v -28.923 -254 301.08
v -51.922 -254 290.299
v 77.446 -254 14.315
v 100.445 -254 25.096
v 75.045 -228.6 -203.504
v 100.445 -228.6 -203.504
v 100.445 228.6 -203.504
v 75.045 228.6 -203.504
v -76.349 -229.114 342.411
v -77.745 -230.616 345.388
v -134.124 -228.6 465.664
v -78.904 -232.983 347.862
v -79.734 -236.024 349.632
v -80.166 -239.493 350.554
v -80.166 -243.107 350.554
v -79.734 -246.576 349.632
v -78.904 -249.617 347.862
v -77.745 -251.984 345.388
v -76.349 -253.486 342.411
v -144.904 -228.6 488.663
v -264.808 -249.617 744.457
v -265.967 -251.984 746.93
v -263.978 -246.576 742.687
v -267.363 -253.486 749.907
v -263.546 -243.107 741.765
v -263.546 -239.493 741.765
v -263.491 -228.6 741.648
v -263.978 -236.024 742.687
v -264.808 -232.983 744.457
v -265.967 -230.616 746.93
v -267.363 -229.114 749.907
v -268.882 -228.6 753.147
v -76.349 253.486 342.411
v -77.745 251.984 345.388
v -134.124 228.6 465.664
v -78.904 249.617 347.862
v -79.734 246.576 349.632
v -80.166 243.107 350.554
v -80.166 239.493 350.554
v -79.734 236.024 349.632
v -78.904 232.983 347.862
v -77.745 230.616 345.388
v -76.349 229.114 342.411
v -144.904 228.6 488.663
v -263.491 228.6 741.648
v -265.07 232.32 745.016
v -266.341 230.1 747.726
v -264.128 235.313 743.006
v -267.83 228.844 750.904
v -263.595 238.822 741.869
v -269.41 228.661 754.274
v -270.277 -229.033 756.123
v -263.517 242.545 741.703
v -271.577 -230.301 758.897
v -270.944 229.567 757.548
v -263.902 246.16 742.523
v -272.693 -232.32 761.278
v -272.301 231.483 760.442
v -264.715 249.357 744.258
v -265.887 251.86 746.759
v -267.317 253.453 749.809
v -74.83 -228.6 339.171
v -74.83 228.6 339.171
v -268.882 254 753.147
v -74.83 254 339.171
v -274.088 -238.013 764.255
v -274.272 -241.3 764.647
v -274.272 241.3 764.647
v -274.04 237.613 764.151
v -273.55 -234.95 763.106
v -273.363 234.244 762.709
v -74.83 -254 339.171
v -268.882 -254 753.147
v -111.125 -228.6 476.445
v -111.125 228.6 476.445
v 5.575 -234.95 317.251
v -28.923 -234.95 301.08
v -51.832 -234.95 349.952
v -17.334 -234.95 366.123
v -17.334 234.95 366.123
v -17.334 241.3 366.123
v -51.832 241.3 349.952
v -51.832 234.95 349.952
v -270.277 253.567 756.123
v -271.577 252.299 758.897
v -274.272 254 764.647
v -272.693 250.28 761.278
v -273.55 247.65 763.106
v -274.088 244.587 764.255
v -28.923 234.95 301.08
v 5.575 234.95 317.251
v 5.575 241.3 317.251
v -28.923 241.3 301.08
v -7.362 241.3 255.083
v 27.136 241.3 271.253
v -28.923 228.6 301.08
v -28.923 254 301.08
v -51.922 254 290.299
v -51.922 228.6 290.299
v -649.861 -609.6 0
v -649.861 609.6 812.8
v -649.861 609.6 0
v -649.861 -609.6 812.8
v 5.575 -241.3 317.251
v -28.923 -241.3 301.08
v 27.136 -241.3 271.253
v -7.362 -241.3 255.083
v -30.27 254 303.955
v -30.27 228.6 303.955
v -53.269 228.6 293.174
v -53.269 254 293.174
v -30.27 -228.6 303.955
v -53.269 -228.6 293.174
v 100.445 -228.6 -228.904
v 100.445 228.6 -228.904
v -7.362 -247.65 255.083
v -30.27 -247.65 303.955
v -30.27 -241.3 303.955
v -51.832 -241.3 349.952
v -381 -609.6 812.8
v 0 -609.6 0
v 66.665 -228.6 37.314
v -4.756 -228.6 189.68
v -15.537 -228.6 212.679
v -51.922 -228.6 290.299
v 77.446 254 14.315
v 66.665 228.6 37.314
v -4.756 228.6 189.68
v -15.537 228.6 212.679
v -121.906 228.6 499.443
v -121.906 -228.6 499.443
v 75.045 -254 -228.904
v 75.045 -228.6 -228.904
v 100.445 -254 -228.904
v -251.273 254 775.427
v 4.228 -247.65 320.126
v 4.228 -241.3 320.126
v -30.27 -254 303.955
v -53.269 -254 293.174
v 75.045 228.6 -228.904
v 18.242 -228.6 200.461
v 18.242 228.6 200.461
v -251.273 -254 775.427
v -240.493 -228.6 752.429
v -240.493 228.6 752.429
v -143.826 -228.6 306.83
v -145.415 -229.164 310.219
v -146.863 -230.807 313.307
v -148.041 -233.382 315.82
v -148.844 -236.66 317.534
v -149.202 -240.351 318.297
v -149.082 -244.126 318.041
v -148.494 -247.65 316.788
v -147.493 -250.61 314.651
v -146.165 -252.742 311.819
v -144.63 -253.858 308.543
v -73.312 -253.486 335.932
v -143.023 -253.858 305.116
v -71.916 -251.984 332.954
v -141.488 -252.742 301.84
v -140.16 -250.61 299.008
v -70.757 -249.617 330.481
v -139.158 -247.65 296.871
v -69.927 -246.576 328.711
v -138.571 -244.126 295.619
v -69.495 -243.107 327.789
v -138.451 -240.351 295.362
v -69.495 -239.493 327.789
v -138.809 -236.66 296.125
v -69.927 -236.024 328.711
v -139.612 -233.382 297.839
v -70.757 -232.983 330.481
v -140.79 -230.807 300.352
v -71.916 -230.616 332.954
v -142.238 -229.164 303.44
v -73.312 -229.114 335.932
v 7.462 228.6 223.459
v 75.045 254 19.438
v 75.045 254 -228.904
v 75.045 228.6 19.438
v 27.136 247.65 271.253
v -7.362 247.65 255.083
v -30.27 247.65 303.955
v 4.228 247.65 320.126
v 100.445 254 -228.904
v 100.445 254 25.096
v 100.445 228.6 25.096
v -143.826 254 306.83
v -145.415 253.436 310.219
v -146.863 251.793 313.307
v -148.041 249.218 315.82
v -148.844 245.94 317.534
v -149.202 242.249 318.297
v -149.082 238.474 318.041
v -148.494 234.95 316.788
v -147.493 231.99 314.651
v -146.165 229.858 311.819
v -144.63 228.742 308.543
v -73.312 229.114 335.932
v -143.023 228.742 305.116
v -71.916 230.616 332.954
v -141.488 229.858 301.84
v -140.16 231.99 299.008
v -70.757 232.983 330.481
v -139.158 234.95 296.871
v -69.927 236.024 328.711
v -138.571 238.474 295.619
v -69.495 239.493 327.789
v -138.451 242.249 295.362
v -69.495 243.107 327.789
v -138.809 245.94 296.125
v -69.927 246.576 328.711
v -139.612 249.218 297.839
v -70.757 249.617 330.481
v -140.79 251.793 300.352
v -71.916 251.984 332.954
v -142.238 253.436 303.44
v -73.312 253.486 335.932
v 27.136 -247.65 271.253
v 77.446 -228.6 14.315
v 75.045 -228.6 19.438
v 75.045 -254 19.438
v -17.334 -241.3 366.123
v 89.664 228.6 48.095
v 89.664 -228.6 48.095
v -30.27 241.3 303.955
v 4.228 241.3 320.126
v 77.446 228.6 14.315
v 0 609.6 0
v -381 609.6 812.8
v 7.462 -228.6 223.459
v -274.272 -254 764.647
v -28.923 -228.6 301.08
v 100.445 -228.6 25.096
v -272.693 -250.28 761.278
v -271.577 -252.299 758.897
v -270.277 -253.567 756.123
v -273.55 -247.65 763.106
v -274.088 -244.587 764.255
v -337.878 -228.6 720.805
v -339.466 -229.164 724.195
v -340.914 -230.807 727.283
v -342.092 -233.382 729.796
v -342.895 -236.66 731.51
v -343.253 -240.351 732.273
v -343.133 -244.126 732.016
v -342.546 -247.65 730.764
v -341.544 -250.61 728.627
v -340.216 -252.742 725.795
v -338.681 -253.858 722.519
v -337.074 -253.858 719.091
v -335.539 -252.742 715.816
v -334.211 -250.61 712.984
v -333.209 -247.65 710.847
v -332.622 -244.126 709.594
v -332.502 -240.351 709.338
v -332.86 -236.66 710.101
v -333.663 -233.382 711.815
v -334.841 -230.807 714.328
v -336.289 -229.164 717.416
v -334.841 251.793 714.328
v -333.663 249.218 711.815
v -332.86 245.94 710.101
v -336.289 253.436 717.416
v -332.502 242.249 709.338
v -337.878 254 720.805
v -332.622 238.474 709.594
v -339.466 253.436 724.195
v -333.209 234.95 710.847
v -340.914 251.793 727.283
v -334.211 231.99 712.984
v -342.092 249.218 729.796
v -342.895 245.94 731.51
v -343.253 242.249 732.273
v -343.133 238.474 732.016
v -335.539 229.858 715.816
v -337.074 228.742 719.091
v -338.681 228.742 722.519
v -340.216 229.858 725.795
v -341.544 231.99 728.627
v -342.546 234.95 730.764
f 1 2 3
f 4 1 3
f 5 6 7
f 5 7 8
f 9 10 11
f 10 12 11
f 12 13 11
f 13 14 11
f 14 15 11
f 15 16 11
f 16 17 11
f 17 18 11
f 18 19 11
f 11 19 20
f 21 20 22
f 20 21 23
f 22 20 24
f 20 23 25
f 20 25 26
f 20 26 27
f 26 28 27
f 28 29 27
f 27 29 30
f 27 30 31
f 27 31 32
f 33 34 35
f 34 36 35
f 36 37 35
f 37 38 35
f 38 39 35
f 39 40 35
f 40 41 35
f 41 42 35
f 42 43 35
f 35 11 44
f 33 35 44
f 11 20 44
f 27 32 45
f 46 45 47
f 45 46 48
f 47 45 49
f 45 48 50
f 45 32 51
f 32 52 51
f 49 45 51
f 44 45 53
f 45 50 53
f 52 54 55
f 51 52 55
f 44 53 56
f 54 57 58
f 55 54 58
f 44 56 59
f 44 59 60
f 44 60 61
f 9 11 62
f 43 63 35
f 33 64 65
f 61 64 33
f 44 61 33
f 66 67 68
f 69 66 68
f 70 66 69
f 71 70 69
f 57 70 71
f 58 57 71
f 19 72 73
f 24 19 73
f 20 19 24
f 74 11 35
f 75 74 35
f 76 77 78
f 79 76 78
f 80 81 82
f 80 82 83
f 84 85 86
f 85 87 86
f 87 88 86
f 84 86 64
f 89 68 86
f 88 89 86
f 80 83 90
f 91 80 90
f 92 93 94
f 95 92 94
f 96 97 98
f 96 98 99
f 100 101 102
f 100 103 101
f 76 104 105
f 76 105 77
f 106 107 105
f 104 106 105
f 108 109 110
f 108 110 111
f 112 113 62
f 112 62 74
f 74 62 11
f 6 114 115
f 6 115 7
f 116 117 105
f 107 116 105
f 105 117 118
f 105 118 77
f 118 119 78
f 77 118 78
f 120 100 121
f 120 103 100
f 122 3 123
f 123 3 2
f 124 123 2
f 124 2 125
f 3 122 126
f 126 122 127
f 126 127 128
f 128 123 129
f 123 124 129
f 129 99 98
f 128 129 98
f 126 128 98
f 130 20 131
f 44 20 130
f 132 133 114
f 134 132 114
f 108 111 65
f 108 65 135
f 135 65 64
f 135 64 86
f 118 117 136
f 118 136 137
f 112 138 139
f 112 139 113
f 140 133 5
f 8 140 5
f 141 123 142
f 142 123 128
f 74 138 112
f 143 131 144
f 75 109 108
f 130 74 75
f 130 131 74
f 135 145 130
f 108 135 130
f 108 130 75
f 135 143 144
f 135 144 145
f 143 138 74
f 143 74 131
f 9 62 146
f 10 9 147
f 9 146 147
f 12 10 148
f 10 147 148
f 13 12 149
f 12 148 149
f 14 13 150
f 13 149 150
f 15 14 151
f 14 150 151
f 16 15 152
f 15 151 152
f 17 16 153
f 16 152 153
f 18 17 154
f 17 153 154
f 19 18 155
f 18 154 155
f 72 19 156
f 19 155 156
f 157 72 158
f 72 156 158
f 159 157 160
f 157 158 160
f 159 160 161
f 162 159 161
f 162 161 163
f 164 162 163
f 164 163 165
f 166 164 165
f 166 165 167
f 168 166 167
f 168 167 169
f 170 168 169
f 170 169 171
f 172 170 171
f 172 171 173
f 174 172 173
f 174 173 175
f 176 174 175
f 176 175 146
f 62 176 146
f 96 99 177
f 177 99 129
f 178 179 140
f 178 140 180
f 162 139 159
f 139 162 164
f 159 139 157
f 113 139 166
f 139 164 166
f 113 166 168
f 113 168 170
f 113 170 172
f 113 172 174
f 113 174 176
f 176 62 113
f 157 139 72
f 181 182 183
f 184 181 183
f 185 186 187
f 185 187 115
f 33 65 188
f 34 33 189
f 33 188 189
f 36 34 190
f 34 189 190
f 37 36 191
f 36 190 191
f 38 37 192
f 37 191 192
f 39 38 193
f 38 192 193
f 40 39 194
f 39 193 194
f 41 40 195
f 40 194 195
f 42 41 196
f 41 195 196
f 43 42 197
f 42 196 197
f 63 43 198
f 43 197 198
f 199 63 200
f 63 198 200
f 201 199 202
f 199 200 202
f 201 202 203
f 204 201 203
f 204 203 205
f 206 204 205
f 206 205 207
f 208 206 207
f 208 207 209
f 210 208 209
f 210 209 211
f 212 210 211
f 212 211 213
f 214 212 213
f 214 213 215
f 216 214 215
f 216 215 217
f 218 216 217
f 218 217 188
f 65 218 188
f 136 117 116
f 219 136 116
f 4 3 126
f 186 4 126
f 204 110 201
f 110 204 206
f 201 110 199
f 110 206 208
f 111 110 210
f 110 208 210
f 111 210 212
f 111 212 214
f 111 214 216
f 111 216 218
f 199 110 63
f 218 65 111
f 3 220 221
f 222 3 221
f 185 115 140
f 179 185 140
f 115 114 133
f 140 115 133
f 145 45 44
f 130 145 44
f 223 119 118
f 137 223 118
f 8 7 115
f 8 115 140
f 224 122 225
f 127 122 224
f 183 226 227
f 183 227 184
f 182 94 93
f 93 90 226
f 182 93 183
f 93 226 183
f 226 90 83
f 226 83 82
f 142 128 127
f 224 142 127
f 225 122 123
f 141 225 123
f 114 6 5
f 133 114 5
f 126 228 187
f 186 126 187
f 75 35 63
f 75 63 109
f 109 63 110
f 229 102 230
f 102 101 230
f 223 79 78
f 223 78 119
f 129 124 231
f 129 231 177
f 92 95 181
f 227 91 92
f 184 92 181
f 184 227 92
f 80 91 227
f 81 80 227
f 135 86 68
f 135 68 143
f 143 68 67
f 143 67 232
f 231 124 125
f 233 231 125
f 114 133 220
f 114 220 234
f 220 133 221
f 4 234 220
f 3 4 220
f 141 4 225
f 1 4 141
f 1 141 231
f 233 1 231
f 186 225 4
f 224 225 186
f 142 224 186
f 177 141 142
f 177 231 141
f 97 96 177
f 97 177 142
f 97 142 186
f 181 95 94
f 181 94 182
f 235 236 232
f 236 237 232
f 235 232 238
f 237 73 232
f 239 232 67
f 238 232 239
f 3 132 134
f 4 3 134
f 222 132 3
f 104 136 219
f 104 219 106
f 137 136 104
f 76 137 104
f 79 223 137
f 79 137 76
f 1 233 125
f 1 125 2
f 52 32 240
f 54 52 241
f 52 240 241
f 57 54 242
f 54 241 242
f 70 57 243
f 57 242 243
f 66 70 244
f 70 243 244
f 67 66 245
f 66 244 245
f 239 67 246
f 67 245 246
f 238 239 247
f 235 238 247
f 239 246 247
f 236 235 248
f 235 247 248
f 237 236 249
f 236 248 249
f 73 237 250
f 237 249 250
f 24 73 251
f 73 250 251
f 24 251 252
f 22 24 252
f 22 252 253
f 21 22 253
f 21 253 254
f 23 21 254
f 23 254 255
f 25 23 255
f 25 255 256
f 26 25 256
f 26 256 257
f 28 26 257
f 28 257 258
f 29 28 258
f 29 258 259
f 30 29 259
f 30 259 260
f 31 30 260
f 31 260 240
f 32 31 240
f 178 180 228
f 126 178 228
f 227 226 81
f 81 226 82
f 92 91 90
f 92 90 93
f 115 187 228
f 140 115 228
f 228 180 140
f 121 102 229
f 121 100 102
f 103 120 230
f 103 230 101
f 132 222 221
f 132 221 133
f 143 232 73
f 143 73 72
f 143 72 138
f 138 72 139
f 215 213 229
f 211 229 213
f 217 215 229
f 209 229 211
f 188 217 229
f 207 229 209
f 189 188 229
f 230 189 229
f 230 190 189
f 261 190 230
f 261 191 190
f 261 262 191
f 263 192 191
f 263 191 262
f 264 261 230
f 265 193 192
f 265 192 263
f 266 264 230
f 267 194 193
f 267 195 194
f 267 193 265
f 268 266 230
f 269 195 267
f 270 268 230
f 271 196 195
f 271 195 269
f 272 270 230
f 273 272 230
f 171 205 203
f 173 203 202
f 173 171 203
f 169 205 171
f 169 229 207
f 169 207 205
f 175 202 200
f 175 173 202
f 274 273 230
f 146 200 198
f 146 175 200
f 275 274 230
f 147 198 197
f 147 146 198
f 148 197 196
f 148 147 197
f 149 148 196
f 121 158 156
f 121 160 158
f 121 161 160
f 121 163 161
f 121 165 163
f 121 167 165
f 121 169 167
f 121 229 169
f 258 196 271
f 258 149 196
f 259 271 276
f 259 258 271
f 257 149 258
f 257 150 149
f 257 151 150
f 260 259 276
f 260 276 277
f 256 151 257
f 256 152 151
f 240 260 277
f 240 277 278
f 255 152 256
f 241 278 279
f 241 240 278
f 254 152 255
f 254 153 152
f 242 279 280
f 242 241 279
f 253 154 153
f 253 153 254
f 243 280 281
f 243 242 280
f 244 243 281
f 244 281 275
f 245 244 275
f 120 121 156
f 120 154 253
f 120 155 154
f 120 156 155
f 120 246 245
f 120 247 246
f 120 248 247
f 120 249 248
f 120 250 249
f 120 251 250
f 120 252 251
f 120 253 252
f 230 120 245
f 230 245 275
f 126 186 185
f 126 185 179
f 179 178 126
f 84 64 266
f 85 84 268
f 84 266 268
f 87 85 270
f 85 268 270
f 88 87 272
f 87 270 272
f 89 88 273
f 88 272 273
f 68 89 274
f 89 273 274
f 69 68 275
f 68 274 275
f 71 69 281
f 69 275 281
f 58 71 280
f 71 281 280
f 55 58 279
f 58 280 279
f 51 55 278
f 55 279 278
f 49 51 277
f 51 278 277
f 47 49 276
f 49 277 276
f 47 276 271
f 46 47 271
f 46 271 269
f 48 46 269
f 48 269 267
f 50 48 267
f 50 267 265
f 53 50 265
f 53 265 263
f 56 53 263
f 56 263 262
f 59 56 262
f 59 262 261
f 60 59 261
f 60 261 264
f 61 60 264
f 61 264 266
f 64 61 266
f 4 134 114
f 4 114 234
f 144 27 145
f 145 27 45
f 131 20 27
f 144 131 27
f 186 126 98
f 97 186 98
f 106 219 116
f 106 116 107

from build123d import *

# Parameters (mm, degrees)
F1_DEPTH  = 609.6
F2_R      = 12.7
F3_DEPTH  = 76.2
F4_W      = 457.2
F4_H      = 25.4
F5_DEPTH  = 25.4
F7_DEPTH  = 25.4
F9_DEPTH  = 25.4
F10_W     = 25.4
F10_H     = 25.4
F11_DEPTH = 457.2
F12_W     = 6.35
F12_H     = 50.8
F12_H_2   = 3.175
F13_DEPTH = 38.1


with BuildPart() as f1:
    # F0 (on Front) → F1 (new body, symmetric)
    with BuildSketch(Plane.XZ):
        Polygon((-649.8614549637, 0), (0, 0), (-381, 812.8), (-649.8614549637, 812.8), align=None)
    extrude(amount=F1_DEPTH, both=True)

    # F2 (on face) → F3 (join)
    with BuildSketch(Plane(origin=(0, 0, 0), x_dir=(0, 1, 0), z_dir=(0.905458936, 0, 0.4244338762))):
        with Locations((-241.3, 796.0663299913)):
            Circle(F2_R)
        with Locations((241.3, 796.0663299913)):
            Circle(F2_R)
        with Locations((241.3, 338.8663299913)):
            Circle(F2_R)
        with Locations((-241.3, 338.8663299913)):
            Circle(F2_R)
    extrude(amount=F3_DEPTH)

    # F4 (on face) → F5 (join)
    with BuildSketch(Plane(origin=(68.9959709201, 0, 32.3418613688), x_dir=(0, 1, 0), z_dir=(0.905458936, 0, 0.4244338762))):
        with BuildLine():
            Line((228.6, 796.0663299913), (-228.6, 796.0663299913))
            ThreePointArc((-228.6, 796.0663299913), (-232.3197438789, 787.0860738702), (-241.3, 783.3663299913))
            Line((-241.3, 783.3663299913), (-241.3, 351.5663299913))
            ThreePointArc((-241.3, 351.5663299913), (-232.3197438789, 347.8465861123), (-228.6, 338.8663299913))
            Line((-228.6, 338.8663299913), (-228.6, 478.5663299913))
            Line((-228.6, 478.5663299913), (-228.6, 503.9663299913))
            Line((-228.6, 503.9663299913), (-228.6, 783.3663299913))
            Line((-228.6, 783.3663299913), (228.6, 783.3663299913))
            Line((228.6, 783.3663299913), (228.6, 503.9663299913))
            Line((228.6, 503.9663299913), (228.6, 478.5663299913))
            Line((228.6, 478.5663299913), (228.6, 338.8663299913))
            ThreePointArc((228.6, 338.8663299913), (232.3197438789, 347.8465861123), (241.3, 351.5663299913))
            Line((241.3, 351.5663299913), (241.3, 783.3663299913))
            ThreePointArc((241.3, 783.3663299913), (232.3197438789, 787.0860738702), (228.6, 796.0663299913))
        make_face()
        with BuildLine():
            ThreePointArc((-241.3, 808.7663299913), (-232.3197438789, 805.0465861123), (-228.6, 796.0663299913))
            Line((-228.6, 796.0663299913), (228.6, 796.0663299913))
            ThreePointArc((228.6, 796.0663299913), (232.3197438789, 805.0465861123), (241.3, 808.7663299913))
            Line((241.3, 808.7663299913), (-241.3, 808.7663299913))
        make_face()
        with BuildLine():
            Line((-241.3, 351.5663299913), (-241.3, 783.3663299913))
            ThreePointArc((-241.3, 783.3663299913), (-250.2802561211, 787.0860738702), (-254, 796.0663299913))
            Line((-254, 796.0663299913), (-254, 338.8663299913))
            ThreePointArc((-254, 338.8663299913), (-250.2802561211, 347.8465861123), (-241.3, 351.5663299913))
        make_face()
        with BuildLine():
            ThreePointArc((254, 796.0663299913), (250.2802561211, 787.0860738702), (241.3, 783.3663299913))
            Line((241.3, 783.3663299913), (241.3, 351.5663299913))
            ThreePointArc((241.3, 351.5663299913), (250.2802561211, 347.8465861123), (254, 338.8663299913))
            Line((254, 338.8663299913), (254, 796.0663299913))
        make_face()
        with BuildLine():
            ThreePointArc((241.3, 808.7663299913), (232.3197438789, 805.0465861123), (228.6, 796.0663299913))
            Line((228.6, 796.0663299913), (241.3, 796.0663299913))
            Line((241.3, 796.0663299913), (241.3, 783.3663299913))
            ThreePointArc((241.3, 783.3663299913), (250.2802561211, 787.0860738702), (254, 796.0663299913))
            ThreePointArc((254, 796.0663299913), (250.2802561211, 805.0465861123), (241.3, 808.7663299913))
        make_face()
        with BuildLine():
            Line((241.3, 796.0663299913), (228.6, 796.0663299913))
            ThreePointArc((228.6, 796.0663299913), (232.3197438789, 787.0860738702), (241.3, 783.3663299913))
            Line((241.3, 783.3663299913), (241.3, 796.0663299913))
        make_face()
        with BuildLine():
            Line((254, 808.7663299913), (241.3, 808.7663299913))
            ThreePointArc((241.3, 808.7663299913), (250.2802561211, 805.0465861123), (254, 796.0663299913))
            Line((254, 796.0663299913), (254, 808.7663299913))
        make_face()
        with BuildLine():
            Line((-241.3, 796.0663299913), (-228.6, 796.0663299913))
            ThreePointArc((-228.6, 796.0663299913), (-232.3197438789, 805.0465861123), (-241.3, 808.7663299913))
            ThreePointArc((-241.3, 808.7663299913), (-250.2802561211, 805.0465861123), (-254, 796.0663299913))
            ThreePointArc((-254, 796.0663299913), (-250.2802561211, 787.0860738702), (-241.3, 783.3663299913))
            Line((-241.3, 783.3663299913), (-241.3, 796.0663299913))
        make_face()
        with BuildLine():
            ThreePointArc((-254, 796.0663299913), (-250.2802561211, 805.0465861123), (-241.3, 808.7663299913))
            Line((-241.3, 808.7663299913), (-254, 808.7663299913))
            Line((-254, 808.7663299913), (-254, 796.0663299913))
        make_face()
        with BuildLine():
            ThreePointArc((-241.3, 783.3663299913), (-232.3197438789, 787.0860738702), (-228.6, 796.0663299913))
            Line((-228.6, 796.0663299913), (-241.3, 796.0663299913))
            Line((-241.3, 796.0663299913), (-241.3, 783.3663299913))
        make_face()
        with Locations((0, 491.2663299913)):
            Rectangle(F4_W, F4_H)
        with BuildLine():
            Line((-241.3, 326.1663299913), (-241.3, 351.5663299913))
            ThreePointArc((-241.3, 351.5663299913), (-250.2802561211, 347.8465861123), (-254, 338.8663299913))
            ThreePointArc((-254, 338.8663299913), (-250.2802561211, 329.8860738702), (-241.3, 326.1663299913))
        make_face()
        with BuildLine():
            ThreePointArc((-228.6, 338.8663299913), (-232.3197438789, 347.8465861123), (-241.3, 351.5663299913))
            Line((-241.3, 351.5663299913), (-241.3, 326.1663299913))
            ThreePointArc((-241.3, 326.1663299913), (-232.3197438789, 329.8860738702), (-228.6, 338.8663299913))
        make_face()
        with BuildLine():
            ThreePointArc((-228.6, 338.8663299913), (-232.3197438789, 329.8860738702), (-241.3, 326.1663299913))
            Line((-241.3, 326.1663299913), (-241.3, 288.0663299913))
            Line((-241.3, 288.0663299913), (-228.6, 288.0663299913))
            Line((-228.6, 288.0663299913), (-228.6, 338.8663299913))
        make_face()
        with BuildLine():
            ThreePointArc((-241.3, 326.1663299913), (-250.2802561211, 329.8860738702), (-254, 338.8663299913))
            Line((-254, 338.8663299913), (-254, 288.0663299913))
            Line((-254, 288.0663299913), (-241.3, 288.0663299913))
            Line((-241.3, 288.0663299913), (-241.3, 326.1663299913))
        make_face()
        with BuildLine():
            ThreePointArc((254, 338.8663299913), (250.2802561211, 347.8465861123), (241.3, 351.5663299913))
            Line((241.3, 351.5663299913), (241.3, 326.1663299913))
            ThreePointArc((241.3, 326.1663299913), (250.2802561211, 329.8860738702), (254, 338.8663299913))
        make_face()
        with BuildLine():
            Line((241.3, 326.1663299913), (241.3, 351.5663299913))
            ThreePointArc((241.3, 351.5663299913), (232.3197438789, 347.8465861123), (228.6, 338.8663299913))
            ThreePointArc((228.6, 338.8663299913), (232.3197438789, 329.8860738702), (241.3, 326.1663299913))
        make_face()
        with BuildLine():
            ThreePointArc((241.3, 326.1663299913), (232.3197438789, 329.8860738702), (228.6, 338.8663299913))
            Line((228.6, 338.8663299913), (228.6, 288.0663299913))
            Line((228.6, 288.0663299913), (241.3, 288.0663299913))
            Line((241.3, 288.0663299913), (241.3, 326.1663299913))
        make_face()
        with BuildLine():
            Line((254, 288.0663299913), (254, 338.8663299913))
            ThreePointArc((254, 338.8663299913), (250.2802561211, 329.8860738702), (241.3, 326.1663299913))
            Line((241.3, 326.1663299913), (241.3, 288.0663299913))
            Line((241.3, 288.0663299913), (254, 288.0663299913))
        make_face()
    extrude(amount=F5_DEPTH)


with BuildPart() as f5:
    # F4 (on face) → F5, piece 2 (new body)
    with BuildSketch(Plane(origin=(68.9959709201, 0, 32.3418613688), x_dir=(0, 1, 0), z_dir=(0.905458936, 0, 0.4244338762))):
        Polygon((-228.6, 284.8913299913), (-254, 284.8913299913), (-254, -19.9086700087), (-228.6, -19.9086700087), (-228.6, 5.4913299913), (-228.6, 173.7663299913), (-228.6, 199.1663299913), align=None)
        Polygon((228.6, 284.8913299913), (228.6, 199.1663299913), (228.6, 173.7663299913), (228.6, 5.4913299913), (228.6, -19.9086700087), (254, -19.9086700087), (254, 284.8913299913), align=None)
        with Locations((0, 186.4663299913)):
            Rectangle(F4_W, F4_H)
        with Locations((0, -7.2086700087)):
            Rectangle(F4_W, F4_H)
    extrude(amount=F5_DEPTH)


with BuildPart() as f7:
    # F6 (on face) → F7 (new body)
    with BuildSketch(Plane.XZ.offset(254)):
        Polygon((100.4445418758, -228.9040013374), (100.4445418758, 25.0959986626), (77.4458849025, 14.3153782063), (75.0445418758, 19.4382433298), (75.0445418758, -228.9040013374), align=None)
    extrude(amount=-F7_DEPTH)


with BuildPart() as f9:
    # F8 (on face) → F9 (new body)
    with BuildSketch(Plane(origin=(0, 254, 0), x_dir=(-1, 0, 0), z_dir=(0, 1, 0))):
        Polygon((-77.4458849025, 14.3153782063), (-100.4445418758, 25.0959986626), (-100.4445418758, -228.9040013374), (-75.0445418758, -228.9040013374), (-75.0445418758, 19.4382433298), align=None)
    extrude(amount=-F9_DEPTH)


with BuildPart() as f11:
    # F10 (on face) → F11 (new body, through all)
    with BuildSketch(Plane(origin=(0, -228.6, 0), x_dir=(-1, 0, 0), z_dir=(0, 1, 0))):
        with Locations((-87.7445418758, -216.2040013374)):
            Rectangle(F10_W, F10_H)
    extrude(amount=F11_DEPTH)


with BuildPart() as f13:
    # F12 (on face) → F13 (new body)
    with BuildSketch(Plane(origin=(91.9946278934, 0, 43.122481825), x_dir=(0, 1, 0), z_dir=(0.905458936, 0, 0.4244338762))):
        Polygon((-241.3, 288.0663299913), (-241.3, 284.8913299913), (-234.95, 284.8913299913), (-234.95, 338.8663299913), (-241.3, 338.8663299913), align=None)
        with Locations((-244.475, 259.4913299913)):
            Rectangle(F12_W, F12_H)
        with Locations((-244.475, 286.4788299913)):
            Rectangle(F12_W, F12_H_2)
    extrude(amount=F13_DEPTH)


with BuildPart() as f13b:
    # F12 (on face) → F13, piece 2 (new body)
    with BuildSketch(Plane(origin=(91.9946278934, 0, 43.122481825), x_dir=(0, 1, 0), z_dir=(0.905458936, 0, 0.4244338762))):
        with Locations((244.475, 259.4913299913)):
            Rectangle(F12_W, F12_H)
        with Locations((244.475, 286.4788299913)):
            Rectangle(F12_W, F12_H_2)
        Polygon((234.95, 284.8913299913), (241.3, 284.8913299913), (241.3, 288.0663299913), (241.3, 338.8663299913), (234.95, 338.8663299913), align=None)
    extrude(amount=F13_DEPTH)


solid = Compound([f1.part, f5.part, f7.part, f9.part, f11.part, f13.part, f13b.part])
